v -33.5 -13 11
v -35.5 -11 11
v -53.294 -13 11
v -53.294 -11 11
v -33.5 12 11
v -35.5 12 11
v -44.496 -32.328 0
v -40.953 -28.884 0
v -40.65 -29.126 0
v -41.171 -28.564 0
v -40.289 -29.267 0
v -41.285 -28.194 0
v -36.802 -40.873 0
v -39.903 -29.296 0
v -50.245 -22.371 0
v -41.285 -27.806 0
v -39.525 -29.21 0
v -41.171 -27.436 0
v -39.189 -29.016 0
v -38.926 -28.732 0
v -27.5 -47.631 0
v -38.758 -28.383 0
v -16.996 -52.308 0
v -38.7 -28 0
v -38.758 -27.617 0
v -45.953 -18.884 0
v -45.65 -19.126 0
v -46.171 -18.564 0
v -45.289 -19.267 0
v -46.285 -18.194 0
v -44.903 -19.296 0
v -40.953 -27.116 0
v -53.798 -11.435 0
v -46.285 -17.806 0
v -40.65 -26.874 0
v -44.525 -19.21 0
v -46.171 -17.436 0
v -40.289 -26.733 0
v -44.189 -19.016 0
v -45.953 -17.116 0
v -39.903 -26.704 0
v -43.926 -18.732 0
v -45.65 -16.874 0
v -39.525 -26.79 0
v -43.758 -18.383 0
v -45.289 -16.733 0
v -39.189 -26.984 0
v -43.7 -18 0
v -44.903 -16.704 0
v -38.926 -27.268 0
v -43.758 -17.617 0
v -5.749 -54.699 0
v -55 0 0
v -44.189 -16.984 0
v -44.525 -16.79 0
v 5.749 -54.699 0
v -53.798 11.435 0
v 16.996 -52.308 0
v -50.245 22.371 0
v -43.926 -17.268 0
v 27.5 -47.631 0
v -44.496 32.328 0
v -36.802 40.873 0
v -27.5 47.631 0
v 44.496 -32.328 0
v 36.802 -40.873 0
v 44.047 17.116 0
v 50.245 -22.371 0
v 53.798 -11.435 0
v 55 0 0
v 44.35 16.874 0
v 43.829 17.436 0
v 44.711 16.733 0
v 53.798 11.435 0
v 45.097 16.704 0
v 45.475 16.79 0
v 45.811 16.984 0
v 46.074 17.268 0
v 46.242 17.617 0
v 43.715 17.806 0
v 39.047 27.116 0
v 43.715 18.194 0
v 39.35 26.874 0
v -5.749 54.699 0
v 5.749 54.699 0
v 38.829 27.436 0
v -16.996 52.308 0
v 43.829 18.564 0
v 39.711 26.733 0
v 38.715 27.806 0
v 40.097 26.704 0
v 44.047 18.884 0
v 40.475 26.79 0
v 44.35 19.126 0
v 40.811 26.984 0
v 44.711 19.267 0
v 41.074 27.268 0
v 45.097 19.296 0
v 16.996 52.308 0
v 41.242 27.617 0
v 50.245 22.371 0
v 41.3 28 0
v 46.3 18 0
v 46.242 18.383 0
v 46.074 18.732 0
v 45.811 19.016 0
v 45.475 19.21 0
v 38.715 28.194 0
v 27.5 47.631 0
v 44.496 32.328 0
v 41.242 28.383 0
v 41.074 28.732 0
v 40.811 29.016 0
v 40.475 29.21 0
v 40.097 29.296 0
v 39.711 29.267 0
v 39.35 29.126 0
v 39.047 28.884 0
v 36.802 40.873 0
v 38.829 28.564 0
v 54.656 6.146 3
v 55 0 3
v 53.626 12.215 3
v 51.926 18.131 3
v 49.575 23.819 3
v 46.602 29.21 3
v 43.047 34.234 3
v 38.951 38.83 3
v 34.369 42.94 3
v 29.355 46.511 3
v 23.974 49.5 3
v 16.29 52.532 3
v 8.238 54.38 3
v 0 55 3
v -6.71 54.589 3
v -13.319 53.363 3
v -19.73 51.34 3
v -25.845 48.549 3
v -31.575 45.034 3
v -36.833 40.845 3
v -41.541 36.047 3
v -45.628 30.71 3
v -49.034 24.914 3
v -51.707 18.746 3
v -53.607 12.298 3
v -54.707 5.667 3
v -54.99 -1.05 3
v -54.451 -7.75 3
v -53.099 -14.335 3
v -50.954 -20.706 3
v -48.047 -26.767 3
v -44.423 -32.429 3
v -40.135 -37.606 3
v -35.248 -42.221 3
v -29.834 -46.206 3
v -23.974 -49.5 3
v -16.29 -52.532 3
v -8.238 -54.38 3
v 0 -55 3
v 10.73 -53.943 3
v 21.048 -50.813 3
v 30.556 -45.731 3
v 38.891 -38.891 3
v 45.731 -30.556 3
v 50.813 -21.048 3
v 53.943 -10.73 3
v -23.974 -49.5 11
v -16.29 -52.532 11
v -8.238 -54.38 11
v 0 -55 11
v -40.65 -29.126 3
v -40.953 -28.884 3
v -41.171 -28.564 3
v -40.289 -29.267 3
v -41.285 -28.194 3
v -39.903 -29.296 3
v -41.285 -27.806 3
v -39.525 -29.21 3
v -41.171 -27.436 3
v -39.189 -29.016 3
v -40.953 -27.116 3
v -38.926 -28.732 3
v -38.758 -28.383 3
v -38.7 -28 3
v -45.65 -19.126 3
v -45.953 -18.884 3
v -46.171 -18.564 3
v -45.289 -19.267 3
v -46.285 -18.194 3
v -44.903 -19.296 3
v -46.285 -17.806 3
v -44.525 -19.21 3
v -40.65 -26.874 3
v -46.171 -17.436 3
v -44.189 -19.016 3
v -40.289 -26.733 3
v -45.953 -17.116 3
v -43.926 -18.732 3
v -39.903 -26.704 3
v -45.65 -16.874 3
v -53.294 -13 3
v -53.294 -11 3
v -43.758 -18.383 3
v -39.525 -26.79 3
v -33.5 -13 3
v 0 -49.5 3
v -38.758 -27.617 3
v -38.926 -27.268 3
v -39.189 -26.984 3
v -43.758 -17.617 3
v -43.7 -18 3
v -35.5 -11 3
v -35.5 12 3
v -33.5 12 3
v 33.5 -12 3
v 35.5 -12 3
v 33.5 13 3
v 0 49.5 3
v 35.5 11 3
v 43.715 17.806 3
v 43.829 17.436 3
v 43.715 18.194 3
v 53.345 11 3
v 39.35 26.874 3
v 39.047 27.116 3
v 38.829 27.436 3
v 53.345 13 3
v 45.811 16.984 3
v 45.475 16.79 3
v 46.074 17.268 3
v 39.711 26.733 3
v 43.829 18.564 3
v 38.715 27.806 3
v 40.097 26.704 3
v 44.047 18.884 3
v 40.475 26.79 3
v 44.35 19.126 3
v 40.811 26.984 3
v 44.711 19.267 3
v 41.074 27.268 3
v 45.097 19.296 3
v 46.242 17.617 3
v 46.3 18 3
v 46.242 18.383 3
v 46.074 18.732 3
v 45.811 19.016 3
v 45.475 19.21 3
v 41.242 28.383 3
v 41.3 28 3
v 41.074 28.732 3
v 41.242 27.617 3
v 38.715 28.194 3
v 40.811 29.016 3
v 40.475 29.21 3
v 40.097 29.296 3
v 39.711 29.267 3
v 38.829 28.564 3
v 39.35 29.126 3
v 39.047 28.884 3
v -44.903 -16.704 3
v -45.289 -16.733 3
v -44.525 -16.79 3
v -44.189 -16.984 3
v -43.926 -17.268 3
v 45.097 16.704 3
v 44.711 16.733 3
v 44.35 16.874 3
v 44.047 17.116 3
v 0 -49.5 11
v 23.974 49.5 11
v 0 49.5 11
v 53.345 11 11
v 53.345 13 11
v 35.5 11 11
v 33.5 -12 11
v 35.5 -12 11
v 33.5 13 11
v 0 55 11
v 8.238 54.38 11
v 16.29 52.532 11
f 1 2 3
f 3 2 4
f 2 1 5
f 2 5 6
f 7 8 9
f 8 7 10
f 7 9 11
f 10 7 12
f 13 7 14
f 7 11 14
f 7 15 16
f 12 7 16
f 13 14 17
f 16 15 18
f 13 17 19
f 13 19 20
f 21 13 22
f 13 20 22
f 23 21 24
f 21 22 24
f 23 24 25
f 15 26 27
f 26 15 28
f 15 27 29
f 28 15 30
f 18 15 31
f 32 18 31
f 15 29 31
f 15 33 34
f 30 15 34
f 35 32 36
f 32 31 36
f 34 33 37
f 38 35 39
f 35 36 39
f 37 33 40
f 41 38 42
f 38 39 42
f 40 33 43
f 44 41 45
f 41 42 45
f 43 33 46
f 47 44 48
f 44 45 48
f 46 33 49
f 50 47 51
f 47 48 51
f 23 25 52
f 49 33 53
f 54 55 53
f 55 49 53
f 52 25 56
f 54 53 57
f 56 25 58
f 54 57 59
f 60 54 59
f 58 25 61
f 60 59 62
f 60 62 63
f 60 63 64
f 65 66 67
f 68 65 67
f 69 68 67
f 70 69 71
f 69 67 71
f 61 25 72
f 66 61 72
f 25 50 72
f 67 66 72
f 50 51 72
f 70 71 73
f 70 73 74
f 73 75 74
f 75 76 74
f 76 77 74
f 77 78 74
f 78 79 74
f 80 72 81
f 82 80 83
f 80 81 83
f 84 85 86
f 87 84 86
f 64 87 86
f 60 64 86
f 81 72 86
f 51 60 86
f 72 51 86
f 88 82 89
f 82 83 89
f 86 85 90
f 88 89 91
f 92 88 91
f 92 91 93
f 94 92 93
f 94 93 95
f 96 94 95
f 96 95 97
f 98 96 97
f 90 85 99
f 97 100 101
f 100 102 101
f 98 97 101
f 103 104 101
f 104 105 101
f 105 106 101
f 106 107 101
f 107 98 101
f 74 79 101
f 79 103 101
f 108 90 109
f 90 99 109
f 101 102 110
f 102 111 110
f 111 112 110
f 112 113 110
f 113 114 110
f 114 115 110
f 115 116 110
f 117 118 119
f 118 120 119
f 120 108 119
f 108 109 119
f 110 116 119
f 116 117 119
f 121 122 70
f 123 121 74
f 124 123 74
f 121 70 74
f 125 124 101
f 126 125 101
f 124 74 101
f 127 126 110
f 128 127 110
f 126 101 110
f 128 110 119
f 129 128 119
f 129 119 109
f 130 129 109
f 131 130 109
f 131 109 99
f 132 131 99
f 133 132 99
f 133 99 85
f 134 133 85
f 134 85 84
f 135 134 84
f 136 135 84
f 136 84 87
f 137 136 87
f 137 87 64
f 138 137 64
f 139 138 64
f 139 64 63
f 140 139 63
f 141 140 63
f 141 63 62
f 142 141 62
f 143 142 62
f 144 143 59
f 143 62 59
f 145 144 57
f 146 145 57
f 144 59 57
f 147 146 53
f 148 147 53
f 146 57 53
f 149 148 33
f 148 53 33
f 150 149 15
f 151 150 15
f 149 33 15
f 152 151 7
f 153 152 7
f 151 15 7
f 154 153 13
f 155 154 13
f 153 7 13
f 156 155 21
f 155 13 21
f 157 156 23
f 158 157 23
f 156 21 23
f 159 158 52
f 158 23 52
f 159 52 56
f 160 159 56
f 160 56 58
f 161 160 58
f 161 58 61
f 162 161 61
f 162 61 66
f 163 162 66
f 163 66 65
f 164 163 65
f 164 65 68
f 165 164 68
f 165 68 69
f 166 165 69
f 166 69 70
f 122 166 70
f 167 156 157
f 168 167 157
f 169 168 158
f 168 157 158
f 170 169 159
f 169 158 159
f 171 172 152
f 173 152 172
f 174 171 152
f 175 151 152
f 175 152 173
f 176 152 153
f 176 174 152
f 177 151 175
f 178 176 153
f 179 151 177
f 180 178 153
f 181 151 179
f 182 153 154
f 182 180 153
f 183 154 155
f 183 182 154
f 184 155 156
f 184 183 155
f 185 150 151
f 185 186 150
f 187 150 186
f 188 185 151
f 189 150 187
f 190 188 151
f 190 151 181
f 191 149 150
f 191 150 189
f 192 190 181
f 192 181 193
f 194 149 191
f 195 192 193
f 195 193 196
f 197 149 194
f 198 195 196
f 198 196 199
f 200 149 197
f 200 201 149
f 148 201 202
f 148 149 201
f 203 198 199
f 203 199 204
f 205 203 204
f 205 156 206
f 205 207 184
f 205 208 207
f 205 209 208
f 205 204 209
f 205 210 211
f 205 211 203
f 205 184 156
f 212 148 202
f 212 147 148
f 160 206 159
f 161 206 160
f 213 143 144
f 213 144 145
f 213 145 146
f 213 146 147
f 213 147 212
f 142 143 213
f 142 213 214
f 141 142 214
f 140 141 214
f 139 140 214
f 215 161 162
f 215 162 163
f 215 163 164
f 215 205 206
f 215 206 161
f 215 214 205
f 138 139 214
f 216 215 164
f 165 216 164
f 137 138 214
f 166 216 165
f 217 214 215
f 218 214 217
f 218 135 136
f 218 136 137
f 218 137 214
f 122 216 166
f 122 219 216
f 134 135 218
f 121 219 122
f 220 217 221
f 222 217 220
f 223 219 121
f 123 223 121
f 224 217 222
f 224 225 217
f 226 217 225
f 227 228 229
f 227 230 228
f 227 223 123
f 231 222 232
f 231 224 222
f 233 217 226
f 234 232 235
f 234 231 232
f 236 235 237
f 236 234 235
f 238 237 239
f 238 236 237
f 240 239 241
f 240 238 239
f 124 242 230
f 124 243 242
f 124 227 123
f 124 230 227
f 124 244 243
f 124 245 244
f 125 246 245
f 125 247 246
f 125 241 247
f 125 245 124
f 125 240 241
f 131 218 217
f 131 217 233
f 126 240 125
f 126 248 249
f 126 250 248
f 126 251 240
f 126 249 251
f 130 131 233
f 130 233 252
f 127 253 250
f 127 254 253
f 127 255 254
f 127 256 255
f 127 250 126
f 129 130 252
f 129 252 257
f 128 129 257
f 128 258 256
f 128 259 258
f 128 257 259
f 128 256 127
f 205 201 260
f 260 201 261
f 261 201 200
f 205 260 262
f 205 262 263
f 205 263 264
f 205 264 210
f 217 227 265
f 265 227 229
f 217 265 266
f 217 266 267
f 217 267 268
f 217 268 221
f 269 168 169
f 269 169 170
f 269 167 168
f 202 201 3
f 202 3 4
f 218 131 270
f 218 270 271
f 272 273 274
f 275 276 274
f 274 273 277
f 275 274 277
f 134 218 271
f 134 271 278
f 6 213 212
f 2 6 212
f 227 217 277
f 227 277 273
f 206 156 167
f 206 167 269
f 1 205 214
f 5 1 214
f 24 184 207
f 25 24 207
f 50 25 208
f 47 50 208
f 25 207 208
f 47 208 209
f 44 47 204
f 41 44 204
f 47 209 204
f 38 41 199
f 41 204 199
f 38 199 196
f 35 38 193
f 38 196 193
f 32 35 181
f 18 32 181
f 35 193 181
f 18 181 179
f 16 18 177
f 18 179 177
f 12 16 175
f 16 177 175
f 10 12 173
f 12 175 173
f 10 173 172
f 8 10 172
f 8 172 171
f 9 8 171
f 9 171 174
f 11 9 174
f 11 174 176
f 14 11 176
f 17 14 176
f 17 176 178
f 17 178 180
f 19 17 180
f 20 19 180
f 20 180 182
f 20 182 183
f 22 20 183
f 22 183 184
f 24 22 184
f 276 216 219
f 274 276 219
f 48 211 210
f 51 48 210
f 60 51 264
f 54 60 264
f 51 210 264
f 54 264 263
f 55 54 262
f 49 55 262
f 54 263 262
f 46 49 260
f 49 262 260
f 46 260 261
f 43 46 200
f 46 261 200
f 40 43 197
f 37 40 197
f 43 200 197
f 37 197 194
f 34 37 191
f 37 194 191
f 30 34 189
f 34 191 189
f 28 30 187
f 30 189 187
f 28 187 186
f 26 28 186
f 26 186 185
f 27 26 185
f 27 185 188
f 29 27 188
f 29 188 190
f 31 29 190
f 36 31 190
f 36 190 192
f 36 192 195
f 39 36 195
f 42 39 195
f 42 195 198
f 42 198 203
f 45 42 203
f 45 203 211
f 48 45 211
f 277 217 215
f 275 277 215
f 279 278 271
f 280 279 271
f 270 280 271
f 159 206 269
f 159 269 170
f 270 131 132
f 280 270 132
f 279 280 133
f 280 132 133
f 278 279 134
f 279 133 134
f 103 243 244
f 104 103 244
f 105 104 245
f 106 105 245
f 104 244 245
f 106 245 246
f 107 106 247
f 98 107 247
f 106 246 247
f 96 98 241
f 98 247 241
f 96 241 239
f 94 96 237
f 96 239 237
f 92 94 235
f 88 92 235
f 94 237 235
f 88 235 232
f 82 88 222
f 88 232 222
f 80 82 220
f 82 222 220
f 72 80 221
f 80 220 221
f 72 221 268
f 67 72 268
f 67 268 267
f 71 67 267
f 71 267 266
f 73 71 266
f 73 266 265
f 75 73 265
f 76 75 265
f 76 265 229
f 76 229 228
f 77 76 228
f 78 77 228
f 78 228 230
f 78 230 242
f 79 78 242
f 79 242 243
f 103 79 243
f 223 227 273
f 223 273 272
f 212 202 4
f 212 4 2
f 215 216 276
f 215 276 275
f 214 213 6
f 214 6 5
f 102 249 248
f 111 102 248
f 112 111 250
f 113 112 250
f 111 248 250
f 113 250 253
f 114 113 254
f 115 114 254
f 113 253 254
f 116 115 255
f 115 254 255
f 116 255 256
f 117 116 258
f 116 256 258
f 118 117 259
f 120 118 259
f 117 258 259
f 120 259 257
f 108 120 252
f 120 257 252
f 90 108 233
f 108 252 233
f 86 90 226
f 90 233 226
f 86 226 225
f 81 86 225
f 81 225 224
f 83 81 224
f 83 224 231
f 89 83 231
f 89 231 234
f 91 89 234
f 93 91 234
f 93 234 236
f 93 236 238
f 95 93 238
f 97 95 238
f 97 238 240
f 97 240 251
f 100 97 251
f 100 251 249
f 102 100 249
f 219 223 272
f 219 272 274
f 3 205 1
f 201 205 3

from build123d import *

# Parameters (mm, degrees)
SKETCH_R     = 55
PAD_DEPTH    = 3
PAD001_DEPTH = 8
PAD002_DEPTH = 8
SKETCH003_R  = 1.3
POCKET_DEPTH = 5


with BuildPart() as part:
    # Sketch → Pad (new body)
    with BuildSketch(Plane.XY):
        Circle(SKETCH_R)
    extrude(amount=PAD_DEPTH)

    # Sketch001 (on Face3 of Pad) → Pad001 (join)
    with BuildSketch(Plane.XY.offset(3)):
        Polygon((33.500008, 0), (33.500008, 13), (53.345406, 13), (53.345406, 11), (35.5, 11), (35.5, -0.005684), (35.5, -12), (33.500008, -12), align=None)
        Polygon((-33.5, 0), (-33.5, -13), (-53.293575, -13), (-53.293575, -11), (-35.5, -11), (-35.5, 0.001212), (-35.5, 12), (-33.5, 12), align=None)
    extrude(amount=PAD001_DEPTH)

    # Sketch002 (on Face3 of Pad001) → Pad002 (join)
    with BuildSketch(Plane.XY.offset(3)):
        with BuildLine():
            ThreePointArc((-23.973944, -49.5), (-12.298374, -53.607369), (0, -55))
            Line((0, -49.5), (0, -55))
            Line((-23.973944, -49.5), (0, -49.5))
        make_face()
        with BuildLine():
            ThreePointArc((23.973944, 49.5), (12.298374, 53.607369), (0, 55))
            Line((0, 49.5), (0, 55))
            Line((23.973944, 49.5), (0, 49.5))
        make_face()
    extrude(amount=PAD002_DEPTH)

    # Sketch003 (on Face3 of Pad002) → Pocket (cut)
    with BuildSketch(Plane.XY.offset(3)):
        with Locations((-45, -18)):
            Circle(SKETCH003_R)
        with Locations((45, 18)):
            Circle(SKETCH003_R)
        with Locations((-40, -28)):
            Circle(SKETCH003_R)
        with Locations((40, 28)):
            Circle(SKETCH003_R)
    extrude(amount=-POCKET_DEPTH, mode=Mode.SUBTRACT)


solid = part.part
